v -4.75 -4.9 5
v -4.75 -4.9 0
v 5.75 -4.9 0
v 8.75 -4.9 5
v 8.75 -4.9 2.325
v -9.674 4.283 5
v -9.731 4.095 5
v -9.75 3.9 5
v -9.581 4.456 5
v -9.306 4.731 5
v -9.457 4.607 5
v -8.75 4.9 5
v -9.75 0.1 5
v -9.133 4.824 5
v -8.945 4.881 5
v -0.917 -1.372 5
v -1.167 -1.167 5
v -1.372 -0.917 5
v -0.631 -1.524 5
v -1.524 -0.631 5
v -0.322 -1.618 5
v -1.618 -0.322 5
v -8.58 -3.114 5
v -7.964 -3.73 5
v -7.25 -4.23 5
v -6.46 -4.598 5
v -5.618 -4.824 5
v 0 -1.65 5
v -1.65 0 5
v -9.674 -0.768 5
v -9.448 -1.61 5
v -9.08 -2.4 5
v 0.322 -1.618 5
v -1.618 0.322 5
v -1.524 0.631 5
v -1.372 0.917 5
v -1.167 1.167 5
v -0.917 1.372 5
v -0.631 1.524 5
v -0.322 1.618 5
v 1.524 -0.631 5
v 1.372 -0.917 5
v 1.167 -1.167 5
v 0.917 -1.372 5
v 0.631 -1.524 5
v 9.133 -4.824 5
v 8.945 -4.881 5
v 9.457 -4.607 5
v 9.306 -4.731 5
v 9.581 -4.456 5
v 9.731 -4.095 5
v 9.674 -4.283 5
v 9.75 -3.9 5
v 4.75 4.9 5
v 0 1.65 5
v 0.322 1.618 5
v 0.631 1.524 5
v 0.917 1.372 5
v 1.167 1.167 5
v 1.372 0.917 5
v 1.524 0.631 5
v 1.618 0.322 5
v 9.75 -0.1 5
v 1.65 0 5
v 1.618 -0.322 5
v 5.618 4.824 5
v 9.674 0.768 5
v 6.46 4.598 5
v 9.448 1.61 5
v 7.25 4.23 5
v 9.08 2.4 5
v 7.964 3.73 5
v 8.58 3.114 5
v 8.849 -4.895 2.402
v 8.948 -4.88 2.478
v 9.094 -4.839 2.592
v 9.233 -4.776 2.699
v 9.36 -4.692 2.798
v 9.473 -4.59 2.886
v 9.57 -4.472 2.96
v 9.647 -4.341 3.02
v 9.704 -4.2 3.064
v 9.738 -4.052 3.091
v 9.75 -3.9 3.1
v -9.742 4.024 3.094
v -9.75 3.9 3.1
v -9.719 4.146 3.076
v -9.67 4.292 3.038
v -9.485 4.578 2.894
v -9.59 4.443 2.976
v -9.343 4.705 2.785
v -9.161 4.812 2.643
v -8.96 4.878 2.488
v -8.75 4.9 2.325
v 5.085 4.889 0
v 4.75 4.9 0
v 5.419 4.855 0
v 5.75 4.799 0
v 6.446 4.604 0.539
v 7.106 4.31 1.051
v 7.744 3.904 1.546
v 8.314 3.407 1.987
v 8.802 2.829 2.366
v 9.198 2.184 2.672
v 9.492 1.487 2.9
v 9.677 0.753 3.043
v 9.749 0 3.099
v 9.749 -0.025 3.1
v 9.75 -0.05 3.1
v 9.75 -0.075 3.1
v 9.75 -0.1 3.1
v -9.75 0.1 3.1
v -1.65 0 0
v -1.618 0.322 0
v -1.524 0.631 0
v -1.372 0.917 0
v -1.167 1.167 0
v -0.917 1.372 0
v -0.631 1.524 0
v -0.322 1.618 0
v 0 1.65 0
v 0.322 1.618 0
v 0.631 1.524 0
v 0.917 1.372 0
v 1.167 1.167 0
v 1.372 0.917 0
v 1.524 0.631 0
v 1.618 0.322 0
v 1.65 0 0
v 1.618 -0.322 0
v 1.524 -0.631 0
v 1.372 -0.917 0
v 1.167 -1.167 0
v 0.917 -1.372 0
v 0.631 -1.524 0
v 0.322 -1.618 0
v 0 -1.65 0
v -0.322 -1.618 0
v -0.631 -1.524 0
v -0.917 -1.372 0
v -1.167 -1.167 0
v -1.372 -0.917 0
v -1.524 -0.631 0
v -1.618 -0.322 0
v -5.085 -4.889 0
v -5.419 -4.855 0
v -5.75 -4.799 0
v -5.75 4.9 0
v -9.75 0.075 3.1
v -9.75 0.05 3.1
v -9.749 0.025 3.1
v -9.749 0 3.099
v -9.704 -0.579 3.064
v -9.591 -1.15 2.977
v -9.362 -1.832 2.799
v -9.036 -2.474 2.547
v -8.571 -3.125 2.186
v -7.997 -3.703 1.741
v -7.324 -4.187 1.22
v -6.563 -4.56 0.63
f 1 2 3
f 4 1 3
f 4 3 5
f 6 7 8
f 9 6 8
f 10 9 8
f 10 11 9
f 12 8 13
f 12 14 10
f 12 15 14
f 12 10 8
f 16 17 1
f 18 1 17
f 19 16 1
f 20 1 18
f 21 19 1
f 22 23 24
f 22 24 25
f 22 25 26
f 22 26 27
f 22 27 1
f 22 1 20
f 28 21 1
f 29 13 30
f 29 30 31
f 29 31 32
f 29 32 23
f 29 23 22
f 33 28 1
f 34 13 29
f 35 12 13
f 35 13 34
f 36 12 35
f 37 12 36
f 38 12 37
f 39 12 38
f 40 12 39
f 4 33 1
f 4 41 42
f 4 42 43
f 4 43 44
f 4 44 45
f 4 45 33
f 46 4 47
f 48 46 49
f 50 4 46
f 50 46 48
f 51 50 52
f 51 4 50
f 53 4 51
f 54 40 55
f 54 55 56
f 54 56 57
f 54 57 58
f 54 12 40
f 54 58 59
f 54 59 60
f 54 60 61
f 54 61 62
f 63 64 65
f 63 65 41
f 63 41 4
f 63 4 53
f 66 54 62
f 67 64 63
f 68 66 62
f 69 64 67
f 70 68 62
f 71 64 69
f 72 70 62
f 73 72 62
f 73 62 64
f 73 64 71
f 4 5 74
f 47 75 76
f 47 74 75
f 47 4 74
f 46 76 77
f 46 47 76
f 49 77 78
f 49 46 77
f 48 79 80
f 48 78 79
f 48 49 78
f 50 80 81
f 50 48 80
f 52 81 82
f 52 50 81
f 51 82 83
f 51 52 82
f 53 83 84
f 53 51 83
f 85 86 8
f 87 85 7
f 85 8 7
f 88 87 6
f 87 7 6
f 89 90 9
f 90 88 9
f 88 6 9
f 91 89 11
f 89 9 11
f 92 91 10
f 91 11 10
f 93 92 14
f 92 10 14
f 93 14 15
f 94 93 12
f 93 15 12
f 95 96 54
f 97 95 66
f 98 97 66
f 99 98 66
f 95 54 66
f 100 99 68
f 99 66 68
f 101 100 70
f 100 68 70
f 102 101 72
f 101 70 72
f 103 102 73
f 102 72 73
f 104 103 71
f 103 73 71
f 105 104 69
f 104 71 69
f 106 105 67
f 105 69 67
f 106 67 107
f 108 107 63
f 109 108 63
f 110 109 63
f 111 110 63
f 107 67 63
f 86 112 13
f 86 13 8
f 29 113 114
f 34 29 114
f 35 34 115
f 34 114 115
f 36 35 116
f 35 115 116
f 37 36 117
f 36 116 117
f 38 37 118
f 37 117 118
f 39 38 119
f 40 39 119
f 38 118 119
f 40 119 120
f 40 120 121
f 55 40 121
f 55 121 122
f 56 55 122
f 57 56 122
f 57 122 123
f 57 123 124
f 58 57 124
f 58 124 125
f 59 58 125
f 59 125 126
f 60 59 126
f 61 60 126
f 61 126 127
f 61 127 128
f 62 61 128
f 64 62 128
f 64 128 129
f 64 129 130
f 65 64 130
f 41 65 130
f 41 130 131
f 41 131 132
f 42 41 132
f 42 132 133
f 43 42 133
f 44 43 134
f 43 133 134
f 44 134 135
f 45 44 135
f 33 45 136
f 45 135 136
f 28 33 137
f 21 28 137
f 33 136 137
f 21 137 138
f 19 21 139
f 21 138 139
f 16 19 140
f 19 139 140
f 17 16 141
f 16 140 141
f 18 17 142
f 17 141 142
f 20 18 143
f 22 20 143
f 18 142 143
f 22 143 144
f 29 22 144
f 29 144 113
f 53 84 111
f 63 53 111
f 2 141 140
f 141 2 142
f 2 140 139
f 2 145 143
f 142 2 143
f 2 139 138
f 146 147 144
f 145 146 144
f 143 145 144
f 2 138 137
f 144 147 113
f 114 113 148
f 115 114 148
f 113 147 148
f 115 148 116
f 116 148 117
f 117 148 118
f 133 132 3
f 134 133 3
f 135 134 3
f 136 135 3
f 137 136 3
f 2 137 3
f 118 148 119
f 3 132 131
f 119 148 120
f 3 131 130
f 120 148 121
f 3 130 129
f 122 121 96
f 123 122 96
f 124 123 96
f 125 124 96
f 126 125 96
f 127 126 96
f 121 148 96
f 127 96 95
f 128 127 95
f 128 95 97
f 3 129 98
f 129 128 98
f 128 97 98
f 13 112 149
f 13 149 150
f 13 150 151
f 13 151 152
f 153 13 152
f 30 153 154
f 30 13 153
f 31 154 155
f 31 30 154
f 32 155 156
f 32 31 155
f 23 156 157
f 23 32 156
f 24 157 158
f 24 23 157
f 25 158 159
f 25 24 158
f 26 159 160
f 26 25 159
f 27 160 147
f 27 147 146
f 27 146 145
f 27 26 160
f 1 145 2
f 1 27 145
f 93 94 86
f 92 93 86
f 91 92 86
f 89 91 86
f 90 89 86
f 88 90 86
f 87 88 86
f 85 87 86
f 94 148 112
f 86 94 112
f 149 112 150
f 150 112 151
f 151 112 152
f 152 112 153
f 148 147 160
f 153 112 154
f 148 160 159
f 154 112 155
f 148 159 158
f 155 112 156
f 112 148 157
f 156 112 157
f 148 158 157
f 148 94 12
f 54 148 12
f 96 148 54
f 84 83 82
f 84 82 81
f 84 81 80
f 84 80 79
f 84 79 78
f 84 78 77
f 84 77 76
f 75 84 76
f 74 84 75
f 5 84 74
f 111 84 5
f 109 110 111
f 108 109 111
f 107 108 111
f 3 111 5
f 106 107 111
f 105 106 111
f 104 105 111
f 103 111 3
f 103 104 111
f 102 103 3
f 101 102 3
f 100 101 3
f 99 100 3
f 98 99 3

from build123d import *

# Parameters (mm, degrees)
F0_W          = 19.5
F0_H          = 9.8
F1_DEPTH      = 5
F3_D          = 3.3
F4_R          = 5
F5_R          = 1
F7_DEPTH      = 4.901
F7_DEPTH_BACK = 4.901


with BuildPart() as f1:
    # F0 (on Top) → F1 (new body)
    with BuildSketch(Plane.XY):
        Rectangle(F0_W, F0_H)
    extrude(amount=F1_DEPTH)

    # F3 (through all)
    with Locations(Plane.XY.offset(5)):
        with Locations((0, 0)):
            Hole(F3_D / 2)

    # F4
    f4_edges = [f1.edges().sort_by_distance(p)[0] for p in [
        (-9.75, -4.9, 2.5),
        (9.75, 4.9, 2.5),
    ]]
    fillet(f4_edges, radius=F4_R)

    # F5
    f5_edges = [f1.edges().sort_by_distance(p)[0] for p in [
        (-9.75, 4.9, 2.5),
        (9.75, -4.9, 2.5),
    ]]
    fillet(f5_edges, radius=F5_R)

    # F6 (on Front) → F7 (cut, two sides)
    with BuildSketch(Plane.XZ) as f7_sk:
        Polygon((9.75, 3.1), (5.75, 0), (9.75, 0), align=None)
        Polygon((-9.75, 3.1), (-9.75, 0), (-5.75, 0), align=None)
    extrude(amount=-F7_DEPTH, mode=Mode.SUBTRACT)
    extrude(f7_sk.sketch, amount=F7_DEPTH_BACK, mode=Mode.SUBTRACT)


solid = f1.part
